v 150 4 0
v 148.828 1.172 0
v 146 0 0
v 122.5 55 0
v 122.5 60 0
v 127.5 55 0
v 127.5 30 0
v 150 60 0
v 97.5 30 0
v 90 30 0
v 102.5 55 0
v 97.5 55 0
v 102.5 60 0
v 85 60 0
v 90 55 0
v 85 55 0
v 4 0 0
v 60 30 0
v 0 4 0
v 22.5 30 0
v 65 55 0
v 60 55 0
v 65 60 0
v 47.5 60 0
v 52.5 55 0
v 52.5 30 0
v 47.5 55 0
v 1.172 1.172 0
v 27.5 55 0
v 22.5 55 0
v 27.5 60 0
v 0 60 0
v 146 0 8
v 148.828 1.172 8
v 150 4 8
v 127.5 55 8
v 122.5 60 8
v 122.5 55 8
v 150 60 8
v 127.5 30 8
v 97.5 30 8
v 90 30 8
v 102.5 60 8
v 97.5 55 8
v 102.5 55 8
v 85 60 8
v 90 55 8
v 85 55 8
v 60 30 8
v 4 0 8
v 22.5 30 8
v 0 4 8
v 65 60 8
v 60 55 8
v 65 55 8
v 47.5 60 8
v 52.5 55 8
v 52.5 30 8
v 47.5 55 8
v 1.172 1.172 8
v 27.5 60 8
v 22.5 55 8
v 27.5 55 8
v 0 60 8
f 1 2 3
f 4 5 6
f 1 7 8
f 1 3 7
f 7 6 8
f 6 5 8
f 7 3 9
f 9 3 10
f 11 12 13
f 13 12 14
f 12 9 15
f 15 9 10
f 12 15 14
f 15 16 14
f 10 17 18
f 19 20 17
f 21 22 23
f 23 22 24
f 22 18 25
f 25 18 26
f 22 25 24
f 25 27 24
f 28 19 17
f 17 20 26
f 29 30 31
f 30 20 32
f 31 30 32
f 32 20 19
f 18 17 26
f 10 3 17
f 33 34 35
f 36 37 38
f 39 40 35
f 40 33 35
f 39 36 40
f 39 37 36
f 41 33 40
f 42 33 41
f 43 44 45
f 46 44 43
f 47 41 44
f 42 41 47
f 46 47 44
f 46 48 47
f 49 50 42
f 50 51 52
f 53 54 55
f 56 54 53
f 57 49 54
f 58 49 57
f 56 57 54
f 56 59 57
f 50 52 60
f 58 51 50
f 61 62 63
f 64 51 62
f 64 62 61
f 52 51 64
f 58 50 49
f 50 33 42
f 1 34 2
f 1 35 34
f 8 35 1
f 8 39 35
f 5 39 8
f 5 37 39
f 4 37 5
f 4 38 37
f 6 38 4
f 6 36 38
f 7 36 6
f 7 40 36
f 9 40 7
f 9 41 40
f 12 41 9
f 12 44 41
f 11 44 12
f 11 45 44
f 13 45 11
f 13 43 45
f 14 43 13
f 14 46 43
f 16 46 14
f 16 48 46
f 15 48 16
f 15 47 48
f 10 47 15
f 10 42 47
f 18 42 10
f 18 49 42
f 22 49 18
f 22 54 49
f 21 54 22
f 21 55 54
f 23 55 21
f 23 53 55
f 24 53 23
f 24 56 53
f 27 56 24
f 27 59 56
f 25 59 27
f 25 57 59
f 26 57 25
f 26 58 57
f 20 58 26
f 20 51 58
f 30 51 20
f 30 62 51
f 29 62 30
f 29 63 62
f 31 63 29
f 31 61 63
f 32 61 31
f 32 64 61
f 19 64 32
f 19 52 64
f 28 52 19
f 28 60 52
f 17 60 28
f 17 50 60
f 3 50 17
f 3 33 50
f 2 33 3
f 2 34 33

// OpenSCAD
$fn = 32;

// ----------------------------------------------------------------------
// Oversize slot bar: 150 mm bar with 3 oversize windows
// ----------------------------------------------------------------------

// --- parameters (mm) ---
profile_height = 8;       // extrusion height
profile_points = 32;      // points of the closed outline

profile = [[0, 4], [1.172, 1.172], [4, 0], [146, 0], [148.828, 1.172], [150, 4], [150, 60], [122.5, 60], [122.5, 55], [127.5, 55], [127.5, 30], [97.5, 30], [97.5, 55], [102.5, 55], [102.5, 60], [85, 60], [85, 55], [90, 55], [90, 30], [60, 30], [60, 55], [65, 55], [65, 60], [47.5, 60], [47.5, 55], [52.5, 55], [52.5, 30], [22.5, 30], [22.5, 55], [27.5, 55], [27.5, 60], [0, 60]];  // single closed polygon, 32 points, counter clockwise

// --- the one profile operation ---
linear_extrude(height = profile_height) polygon(points = profile);
